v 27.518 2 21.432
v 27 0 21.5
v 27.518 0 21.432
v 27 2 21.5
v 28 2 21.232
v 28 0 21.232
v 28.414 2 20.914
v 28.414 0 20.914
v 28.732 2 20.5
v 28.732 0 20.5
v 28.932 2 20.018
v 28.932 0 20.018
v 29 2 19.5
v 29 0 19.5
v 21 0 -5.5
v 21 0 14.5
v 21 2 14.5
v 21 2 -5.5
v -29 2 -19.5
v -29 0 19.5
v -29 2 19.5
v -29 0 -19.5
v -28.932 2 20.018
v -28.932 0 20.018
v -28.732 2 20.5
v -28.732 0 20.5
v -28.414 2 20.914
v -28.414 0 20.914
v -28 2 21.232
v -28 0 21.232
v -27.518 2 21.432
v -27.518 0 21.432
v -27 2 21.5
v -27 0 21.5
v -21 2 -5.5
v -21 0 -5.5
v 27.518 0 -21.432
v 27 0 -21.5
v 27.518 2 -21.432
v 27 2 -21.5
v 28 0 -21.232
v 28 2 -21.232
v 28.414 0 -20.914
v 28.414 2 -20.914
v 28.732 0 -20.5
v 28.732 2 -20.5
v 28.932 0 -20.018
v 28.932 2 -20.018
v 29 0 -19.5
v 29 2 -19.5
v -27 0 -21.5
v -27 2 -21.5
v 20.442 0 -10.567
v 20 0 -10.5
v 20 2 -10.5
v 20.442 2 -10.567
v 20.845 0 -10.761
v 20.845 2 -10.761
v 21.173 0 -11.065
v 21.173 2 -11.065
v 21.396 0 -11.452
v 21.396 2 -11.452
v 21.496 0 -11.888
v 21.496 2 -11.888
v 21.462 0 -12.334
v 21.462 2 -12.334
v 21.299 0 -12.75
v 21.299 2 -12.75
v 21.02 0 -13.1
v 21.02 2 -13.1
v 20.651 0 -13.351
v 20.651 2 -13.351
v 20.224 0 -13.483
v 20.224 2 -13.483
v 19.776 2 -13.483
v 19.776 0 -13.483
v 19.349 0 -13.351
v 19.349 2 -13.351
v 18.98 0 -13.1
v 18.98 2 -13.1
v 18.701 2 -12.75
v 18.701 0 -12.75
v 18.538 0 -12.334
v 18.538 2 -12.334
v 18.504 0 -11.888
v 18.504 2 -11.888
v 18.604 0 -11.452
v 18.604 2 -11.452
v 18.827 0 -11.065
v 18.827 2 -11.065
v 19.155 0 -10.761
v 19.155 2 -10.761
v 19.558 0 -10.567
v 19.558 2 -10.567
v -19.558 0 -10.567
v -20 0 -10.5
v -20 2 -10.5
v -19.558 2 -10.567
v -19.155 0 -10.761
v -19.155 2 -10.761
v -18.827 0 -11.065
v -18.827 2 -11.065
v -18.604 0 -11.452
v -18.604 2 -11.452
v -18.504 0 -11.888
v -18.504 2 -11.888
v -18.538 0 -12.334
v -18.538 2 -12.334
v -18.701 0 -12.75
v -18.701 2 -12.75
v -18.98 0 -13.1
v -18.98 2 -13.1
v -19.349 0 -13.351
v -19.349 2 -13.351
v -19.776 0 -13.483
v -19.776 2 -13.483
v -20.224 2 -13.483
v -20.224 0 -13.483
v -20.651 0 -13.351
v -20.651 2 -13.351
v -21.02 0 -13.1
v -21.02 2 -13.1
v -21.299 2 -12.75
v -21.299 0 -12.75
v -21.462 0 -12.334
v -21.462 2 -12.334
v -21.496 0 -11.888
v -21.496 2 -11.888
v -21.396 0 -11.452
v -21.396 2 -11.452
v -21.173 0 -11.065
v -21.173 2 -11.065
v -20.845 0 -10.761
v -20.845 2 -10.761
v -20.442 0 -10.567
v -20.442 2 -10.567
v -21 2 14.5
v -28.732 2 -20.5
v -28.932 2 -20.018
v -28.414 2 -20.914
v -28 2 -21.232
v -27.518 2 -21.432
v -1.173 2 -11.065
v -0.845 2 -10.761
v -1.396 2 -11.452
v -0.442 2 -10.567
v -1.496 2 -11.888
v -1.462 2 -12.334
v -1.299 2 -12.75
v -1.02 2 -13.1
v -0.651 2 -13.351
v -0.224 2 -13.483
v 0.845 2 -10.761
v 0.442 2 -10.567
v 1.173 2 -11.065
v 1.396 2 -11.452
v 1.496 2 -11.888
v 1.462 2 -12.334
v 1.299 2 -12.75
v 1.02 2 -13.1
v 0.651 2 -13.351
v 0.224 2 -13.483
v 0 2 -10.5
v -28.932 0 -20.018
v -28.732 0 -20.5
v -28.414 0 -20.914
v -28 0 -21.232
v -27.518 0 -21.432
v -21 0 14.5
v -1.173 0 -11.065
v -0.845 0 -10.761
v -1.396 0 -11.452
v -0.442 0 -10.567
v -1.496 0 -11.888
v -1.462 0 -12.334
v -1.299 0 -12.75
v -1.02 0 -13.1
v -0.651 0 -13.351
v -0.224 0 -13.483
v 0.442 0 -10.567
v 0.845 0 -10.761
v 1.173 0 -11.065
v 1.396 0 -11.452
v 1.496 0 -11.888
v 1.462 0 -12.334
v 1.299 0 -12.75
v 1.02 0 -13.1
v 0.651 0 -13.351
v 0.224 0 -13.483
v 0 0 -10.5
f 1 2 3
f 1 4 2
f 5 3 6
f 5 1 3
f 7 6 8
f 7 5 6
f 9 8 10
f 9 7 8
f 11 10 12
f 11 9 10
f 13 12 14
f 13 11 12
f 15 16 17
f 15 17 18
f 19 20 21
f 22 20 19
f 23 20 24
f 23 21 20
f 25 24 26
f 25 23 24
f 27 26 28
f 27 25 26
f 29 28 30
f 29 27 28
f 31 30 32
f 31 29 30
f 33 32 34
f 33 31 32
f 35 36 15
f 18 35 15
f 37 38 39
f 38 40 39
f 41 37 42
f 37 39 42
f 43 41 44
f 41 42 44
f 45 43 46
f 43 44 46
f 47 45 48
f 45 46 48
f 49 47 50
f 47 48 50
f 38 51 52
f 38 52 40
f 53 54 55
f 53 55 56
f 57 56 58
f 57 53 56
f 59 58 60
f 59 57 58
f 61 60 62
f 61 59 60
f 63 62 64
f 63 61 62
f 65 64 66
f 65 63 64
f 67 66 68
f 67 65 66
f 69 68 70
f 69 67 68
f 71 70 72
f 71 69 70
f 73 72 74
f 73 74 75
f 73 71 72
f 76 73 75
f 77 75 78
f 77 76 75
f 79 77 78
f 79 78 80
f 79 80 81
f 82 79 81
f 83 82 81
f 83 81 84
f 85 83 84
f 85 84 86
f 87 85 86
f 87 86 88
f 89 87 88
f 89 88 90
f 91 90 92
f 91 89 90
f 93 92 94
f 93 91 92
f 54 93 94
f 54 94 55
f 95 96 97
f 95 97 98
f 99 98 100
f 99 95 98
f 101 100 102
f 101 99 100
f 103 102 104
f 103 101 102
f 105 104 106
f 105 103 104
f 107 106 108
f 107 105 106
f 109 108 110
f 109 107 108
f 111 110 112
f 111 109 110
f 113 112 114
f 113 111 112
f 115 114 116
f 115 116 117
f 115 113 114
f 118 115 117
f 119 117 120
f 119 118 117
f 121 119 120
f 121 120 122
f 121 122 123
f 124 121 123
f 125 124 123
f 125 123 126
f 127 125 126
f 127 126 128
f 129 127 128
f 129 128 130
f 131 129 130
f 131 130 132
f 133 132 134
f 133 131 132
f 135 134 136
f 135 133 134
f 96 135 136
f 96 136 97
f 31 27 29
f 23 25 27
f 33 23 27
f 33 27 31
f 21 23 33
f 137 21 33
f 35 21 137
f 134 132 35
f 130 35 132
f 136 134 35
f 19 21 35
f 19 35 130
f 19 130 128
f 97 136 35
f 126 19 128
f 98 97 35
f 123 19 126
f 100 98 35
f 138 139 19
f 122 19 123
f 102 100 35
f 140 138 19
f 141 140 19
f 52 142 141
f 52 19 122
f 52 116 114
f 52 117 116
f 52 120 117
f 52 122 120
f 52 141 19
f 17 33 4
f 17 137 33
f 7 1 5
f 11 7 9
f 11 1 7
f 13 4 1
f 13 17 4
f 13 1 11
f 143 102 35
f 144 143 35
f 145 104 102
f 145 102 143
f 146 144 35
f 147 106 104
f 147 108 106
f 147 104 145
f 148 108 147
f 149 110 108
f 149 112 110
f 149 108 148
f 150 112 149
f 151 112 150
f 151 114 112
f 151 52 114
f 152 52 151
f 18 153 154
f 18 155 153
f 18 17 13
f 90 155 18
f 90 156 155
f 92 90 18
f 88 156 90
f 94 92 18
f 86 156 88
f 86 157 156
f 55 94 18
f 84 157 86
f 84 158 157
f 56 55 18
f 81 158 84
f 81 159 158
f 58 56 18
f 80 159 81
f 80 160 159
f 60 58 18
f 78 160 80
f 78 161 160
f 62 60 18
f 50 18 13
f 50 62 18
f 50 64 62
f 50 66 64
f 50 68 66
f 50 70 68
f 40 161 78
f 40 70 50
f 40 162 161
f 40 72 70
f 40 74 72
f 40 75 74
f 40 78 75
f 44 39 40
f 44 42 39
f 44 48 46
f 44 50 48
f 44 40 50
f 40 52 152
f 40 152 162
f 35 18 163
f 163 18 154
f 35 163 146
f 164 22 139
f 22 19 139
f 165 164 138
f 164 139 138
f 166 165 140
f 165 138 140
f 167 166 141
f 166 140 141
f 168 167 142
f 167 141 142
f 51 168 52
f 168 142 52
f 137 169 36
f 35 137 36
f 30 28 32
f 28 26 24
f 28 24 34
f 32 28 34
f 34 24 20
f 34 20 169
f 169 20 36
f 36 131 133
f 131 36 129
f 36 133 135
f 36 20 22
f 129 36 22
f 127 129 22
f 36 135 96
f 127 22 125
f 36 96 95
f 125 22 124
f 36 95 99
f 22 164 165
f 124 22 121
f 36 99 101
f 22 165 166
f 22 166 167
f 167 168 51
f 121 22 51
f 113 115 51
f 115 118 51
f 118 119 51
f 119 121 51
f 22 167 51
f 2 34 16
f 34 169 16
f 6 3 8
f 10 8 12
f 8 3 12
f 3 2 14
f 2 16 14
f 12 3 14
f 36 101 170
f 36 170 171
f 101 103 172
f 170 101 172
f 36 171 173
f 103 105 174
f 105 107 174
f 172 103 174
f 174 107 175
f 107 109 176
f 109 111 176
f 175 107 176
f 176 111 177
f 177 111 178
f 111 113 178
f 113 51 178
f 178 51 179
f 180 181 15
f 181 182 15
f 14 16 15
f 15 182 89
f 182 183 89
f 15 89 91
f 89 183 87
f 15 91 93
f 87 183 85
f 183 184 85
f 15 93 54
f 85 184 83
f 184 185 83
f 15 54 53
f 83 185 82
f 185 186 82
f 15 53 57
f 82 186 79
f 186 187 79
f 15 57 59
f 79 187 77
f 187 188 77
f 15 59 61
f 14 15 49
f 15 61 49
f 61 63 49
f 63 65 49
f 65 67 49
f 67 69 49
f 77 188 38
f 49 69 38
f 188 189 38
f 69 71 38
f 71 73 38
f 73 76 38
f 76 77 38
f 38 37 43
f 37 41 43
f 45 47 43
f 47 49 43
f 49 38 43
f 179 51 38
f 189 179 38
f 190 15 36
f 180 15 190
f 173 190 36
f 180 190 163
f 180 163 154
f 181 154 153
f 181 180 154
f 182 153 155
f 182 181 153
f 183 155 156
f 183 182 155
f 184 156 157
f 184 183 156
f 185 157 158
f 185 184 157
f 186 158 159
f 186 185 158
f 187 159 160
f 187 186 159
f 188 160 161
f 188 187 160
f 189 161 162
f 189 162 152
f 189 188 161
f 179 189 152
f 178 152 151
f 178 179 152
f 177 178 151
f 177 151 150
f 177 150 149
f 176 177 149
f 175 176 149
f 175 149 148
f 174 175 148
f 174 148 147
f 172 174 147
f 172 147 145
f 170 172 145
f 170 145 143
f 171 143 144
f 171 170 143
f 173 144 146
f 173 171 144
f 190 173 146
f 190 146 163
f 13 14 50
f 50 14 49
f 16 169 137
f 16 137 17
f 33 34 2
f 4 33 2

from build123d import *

# Parameters (mm, degrees)
SKETCH1_W           = 58
SKETCH1_H           = 43
SKETCH1_R           = 1.5
SKETCH1_W_2         = 42
SKETCH1_H_2         = 20
BOSS_EXTRUDE1_DEPTH = 2
FILLET1_R           = 2


with BuildPart() as part:
    # Sketch1 → Boss-Extrude1 (new body)
    with BuildSketch(Plane(origin=(0, 0, 0), x_dir=(1, 0, 0), z_dir=(0, 1, 0))):
        Rectangle(SKETCH1_W, SKETCH1_H)
        with Locations(Location((0, 12, 0), (0, 0, 270))):
            Circle(SKETCH1_R, mode=Mode.SUBTRACT)
        with Locations(Location((20, 12, 0), (0, 0, 270))):
            Circle(SKETCH1_R, mode=Mode.SUBTRACT)
        with Locations(Location((-20, 12, 0), (0, 0, 270))):
            Circle(SKETCH1_R, mode=Mode.SUBTRACT)
        with Locations((0, -4.5)):
            Rectangle(SKETCH1_W_2, SKETCH1_H_2, mode=Mode.SUBTRACT)
    extrude(amount=BOSS_EXTRUDE1_DEPTH)

    # Fillet1
    fillet1_edges = [part.edges().sort_by_distance(p)[0] for p in [
        (29, 1, 21.5),
        (-29, 1, 21.5),
        (-29, 1, -21.5),
        (29, 1, -21.5),
    ]]
    fillet(fillet1_edges, radius=FILLET1_R)


solid = part.part
